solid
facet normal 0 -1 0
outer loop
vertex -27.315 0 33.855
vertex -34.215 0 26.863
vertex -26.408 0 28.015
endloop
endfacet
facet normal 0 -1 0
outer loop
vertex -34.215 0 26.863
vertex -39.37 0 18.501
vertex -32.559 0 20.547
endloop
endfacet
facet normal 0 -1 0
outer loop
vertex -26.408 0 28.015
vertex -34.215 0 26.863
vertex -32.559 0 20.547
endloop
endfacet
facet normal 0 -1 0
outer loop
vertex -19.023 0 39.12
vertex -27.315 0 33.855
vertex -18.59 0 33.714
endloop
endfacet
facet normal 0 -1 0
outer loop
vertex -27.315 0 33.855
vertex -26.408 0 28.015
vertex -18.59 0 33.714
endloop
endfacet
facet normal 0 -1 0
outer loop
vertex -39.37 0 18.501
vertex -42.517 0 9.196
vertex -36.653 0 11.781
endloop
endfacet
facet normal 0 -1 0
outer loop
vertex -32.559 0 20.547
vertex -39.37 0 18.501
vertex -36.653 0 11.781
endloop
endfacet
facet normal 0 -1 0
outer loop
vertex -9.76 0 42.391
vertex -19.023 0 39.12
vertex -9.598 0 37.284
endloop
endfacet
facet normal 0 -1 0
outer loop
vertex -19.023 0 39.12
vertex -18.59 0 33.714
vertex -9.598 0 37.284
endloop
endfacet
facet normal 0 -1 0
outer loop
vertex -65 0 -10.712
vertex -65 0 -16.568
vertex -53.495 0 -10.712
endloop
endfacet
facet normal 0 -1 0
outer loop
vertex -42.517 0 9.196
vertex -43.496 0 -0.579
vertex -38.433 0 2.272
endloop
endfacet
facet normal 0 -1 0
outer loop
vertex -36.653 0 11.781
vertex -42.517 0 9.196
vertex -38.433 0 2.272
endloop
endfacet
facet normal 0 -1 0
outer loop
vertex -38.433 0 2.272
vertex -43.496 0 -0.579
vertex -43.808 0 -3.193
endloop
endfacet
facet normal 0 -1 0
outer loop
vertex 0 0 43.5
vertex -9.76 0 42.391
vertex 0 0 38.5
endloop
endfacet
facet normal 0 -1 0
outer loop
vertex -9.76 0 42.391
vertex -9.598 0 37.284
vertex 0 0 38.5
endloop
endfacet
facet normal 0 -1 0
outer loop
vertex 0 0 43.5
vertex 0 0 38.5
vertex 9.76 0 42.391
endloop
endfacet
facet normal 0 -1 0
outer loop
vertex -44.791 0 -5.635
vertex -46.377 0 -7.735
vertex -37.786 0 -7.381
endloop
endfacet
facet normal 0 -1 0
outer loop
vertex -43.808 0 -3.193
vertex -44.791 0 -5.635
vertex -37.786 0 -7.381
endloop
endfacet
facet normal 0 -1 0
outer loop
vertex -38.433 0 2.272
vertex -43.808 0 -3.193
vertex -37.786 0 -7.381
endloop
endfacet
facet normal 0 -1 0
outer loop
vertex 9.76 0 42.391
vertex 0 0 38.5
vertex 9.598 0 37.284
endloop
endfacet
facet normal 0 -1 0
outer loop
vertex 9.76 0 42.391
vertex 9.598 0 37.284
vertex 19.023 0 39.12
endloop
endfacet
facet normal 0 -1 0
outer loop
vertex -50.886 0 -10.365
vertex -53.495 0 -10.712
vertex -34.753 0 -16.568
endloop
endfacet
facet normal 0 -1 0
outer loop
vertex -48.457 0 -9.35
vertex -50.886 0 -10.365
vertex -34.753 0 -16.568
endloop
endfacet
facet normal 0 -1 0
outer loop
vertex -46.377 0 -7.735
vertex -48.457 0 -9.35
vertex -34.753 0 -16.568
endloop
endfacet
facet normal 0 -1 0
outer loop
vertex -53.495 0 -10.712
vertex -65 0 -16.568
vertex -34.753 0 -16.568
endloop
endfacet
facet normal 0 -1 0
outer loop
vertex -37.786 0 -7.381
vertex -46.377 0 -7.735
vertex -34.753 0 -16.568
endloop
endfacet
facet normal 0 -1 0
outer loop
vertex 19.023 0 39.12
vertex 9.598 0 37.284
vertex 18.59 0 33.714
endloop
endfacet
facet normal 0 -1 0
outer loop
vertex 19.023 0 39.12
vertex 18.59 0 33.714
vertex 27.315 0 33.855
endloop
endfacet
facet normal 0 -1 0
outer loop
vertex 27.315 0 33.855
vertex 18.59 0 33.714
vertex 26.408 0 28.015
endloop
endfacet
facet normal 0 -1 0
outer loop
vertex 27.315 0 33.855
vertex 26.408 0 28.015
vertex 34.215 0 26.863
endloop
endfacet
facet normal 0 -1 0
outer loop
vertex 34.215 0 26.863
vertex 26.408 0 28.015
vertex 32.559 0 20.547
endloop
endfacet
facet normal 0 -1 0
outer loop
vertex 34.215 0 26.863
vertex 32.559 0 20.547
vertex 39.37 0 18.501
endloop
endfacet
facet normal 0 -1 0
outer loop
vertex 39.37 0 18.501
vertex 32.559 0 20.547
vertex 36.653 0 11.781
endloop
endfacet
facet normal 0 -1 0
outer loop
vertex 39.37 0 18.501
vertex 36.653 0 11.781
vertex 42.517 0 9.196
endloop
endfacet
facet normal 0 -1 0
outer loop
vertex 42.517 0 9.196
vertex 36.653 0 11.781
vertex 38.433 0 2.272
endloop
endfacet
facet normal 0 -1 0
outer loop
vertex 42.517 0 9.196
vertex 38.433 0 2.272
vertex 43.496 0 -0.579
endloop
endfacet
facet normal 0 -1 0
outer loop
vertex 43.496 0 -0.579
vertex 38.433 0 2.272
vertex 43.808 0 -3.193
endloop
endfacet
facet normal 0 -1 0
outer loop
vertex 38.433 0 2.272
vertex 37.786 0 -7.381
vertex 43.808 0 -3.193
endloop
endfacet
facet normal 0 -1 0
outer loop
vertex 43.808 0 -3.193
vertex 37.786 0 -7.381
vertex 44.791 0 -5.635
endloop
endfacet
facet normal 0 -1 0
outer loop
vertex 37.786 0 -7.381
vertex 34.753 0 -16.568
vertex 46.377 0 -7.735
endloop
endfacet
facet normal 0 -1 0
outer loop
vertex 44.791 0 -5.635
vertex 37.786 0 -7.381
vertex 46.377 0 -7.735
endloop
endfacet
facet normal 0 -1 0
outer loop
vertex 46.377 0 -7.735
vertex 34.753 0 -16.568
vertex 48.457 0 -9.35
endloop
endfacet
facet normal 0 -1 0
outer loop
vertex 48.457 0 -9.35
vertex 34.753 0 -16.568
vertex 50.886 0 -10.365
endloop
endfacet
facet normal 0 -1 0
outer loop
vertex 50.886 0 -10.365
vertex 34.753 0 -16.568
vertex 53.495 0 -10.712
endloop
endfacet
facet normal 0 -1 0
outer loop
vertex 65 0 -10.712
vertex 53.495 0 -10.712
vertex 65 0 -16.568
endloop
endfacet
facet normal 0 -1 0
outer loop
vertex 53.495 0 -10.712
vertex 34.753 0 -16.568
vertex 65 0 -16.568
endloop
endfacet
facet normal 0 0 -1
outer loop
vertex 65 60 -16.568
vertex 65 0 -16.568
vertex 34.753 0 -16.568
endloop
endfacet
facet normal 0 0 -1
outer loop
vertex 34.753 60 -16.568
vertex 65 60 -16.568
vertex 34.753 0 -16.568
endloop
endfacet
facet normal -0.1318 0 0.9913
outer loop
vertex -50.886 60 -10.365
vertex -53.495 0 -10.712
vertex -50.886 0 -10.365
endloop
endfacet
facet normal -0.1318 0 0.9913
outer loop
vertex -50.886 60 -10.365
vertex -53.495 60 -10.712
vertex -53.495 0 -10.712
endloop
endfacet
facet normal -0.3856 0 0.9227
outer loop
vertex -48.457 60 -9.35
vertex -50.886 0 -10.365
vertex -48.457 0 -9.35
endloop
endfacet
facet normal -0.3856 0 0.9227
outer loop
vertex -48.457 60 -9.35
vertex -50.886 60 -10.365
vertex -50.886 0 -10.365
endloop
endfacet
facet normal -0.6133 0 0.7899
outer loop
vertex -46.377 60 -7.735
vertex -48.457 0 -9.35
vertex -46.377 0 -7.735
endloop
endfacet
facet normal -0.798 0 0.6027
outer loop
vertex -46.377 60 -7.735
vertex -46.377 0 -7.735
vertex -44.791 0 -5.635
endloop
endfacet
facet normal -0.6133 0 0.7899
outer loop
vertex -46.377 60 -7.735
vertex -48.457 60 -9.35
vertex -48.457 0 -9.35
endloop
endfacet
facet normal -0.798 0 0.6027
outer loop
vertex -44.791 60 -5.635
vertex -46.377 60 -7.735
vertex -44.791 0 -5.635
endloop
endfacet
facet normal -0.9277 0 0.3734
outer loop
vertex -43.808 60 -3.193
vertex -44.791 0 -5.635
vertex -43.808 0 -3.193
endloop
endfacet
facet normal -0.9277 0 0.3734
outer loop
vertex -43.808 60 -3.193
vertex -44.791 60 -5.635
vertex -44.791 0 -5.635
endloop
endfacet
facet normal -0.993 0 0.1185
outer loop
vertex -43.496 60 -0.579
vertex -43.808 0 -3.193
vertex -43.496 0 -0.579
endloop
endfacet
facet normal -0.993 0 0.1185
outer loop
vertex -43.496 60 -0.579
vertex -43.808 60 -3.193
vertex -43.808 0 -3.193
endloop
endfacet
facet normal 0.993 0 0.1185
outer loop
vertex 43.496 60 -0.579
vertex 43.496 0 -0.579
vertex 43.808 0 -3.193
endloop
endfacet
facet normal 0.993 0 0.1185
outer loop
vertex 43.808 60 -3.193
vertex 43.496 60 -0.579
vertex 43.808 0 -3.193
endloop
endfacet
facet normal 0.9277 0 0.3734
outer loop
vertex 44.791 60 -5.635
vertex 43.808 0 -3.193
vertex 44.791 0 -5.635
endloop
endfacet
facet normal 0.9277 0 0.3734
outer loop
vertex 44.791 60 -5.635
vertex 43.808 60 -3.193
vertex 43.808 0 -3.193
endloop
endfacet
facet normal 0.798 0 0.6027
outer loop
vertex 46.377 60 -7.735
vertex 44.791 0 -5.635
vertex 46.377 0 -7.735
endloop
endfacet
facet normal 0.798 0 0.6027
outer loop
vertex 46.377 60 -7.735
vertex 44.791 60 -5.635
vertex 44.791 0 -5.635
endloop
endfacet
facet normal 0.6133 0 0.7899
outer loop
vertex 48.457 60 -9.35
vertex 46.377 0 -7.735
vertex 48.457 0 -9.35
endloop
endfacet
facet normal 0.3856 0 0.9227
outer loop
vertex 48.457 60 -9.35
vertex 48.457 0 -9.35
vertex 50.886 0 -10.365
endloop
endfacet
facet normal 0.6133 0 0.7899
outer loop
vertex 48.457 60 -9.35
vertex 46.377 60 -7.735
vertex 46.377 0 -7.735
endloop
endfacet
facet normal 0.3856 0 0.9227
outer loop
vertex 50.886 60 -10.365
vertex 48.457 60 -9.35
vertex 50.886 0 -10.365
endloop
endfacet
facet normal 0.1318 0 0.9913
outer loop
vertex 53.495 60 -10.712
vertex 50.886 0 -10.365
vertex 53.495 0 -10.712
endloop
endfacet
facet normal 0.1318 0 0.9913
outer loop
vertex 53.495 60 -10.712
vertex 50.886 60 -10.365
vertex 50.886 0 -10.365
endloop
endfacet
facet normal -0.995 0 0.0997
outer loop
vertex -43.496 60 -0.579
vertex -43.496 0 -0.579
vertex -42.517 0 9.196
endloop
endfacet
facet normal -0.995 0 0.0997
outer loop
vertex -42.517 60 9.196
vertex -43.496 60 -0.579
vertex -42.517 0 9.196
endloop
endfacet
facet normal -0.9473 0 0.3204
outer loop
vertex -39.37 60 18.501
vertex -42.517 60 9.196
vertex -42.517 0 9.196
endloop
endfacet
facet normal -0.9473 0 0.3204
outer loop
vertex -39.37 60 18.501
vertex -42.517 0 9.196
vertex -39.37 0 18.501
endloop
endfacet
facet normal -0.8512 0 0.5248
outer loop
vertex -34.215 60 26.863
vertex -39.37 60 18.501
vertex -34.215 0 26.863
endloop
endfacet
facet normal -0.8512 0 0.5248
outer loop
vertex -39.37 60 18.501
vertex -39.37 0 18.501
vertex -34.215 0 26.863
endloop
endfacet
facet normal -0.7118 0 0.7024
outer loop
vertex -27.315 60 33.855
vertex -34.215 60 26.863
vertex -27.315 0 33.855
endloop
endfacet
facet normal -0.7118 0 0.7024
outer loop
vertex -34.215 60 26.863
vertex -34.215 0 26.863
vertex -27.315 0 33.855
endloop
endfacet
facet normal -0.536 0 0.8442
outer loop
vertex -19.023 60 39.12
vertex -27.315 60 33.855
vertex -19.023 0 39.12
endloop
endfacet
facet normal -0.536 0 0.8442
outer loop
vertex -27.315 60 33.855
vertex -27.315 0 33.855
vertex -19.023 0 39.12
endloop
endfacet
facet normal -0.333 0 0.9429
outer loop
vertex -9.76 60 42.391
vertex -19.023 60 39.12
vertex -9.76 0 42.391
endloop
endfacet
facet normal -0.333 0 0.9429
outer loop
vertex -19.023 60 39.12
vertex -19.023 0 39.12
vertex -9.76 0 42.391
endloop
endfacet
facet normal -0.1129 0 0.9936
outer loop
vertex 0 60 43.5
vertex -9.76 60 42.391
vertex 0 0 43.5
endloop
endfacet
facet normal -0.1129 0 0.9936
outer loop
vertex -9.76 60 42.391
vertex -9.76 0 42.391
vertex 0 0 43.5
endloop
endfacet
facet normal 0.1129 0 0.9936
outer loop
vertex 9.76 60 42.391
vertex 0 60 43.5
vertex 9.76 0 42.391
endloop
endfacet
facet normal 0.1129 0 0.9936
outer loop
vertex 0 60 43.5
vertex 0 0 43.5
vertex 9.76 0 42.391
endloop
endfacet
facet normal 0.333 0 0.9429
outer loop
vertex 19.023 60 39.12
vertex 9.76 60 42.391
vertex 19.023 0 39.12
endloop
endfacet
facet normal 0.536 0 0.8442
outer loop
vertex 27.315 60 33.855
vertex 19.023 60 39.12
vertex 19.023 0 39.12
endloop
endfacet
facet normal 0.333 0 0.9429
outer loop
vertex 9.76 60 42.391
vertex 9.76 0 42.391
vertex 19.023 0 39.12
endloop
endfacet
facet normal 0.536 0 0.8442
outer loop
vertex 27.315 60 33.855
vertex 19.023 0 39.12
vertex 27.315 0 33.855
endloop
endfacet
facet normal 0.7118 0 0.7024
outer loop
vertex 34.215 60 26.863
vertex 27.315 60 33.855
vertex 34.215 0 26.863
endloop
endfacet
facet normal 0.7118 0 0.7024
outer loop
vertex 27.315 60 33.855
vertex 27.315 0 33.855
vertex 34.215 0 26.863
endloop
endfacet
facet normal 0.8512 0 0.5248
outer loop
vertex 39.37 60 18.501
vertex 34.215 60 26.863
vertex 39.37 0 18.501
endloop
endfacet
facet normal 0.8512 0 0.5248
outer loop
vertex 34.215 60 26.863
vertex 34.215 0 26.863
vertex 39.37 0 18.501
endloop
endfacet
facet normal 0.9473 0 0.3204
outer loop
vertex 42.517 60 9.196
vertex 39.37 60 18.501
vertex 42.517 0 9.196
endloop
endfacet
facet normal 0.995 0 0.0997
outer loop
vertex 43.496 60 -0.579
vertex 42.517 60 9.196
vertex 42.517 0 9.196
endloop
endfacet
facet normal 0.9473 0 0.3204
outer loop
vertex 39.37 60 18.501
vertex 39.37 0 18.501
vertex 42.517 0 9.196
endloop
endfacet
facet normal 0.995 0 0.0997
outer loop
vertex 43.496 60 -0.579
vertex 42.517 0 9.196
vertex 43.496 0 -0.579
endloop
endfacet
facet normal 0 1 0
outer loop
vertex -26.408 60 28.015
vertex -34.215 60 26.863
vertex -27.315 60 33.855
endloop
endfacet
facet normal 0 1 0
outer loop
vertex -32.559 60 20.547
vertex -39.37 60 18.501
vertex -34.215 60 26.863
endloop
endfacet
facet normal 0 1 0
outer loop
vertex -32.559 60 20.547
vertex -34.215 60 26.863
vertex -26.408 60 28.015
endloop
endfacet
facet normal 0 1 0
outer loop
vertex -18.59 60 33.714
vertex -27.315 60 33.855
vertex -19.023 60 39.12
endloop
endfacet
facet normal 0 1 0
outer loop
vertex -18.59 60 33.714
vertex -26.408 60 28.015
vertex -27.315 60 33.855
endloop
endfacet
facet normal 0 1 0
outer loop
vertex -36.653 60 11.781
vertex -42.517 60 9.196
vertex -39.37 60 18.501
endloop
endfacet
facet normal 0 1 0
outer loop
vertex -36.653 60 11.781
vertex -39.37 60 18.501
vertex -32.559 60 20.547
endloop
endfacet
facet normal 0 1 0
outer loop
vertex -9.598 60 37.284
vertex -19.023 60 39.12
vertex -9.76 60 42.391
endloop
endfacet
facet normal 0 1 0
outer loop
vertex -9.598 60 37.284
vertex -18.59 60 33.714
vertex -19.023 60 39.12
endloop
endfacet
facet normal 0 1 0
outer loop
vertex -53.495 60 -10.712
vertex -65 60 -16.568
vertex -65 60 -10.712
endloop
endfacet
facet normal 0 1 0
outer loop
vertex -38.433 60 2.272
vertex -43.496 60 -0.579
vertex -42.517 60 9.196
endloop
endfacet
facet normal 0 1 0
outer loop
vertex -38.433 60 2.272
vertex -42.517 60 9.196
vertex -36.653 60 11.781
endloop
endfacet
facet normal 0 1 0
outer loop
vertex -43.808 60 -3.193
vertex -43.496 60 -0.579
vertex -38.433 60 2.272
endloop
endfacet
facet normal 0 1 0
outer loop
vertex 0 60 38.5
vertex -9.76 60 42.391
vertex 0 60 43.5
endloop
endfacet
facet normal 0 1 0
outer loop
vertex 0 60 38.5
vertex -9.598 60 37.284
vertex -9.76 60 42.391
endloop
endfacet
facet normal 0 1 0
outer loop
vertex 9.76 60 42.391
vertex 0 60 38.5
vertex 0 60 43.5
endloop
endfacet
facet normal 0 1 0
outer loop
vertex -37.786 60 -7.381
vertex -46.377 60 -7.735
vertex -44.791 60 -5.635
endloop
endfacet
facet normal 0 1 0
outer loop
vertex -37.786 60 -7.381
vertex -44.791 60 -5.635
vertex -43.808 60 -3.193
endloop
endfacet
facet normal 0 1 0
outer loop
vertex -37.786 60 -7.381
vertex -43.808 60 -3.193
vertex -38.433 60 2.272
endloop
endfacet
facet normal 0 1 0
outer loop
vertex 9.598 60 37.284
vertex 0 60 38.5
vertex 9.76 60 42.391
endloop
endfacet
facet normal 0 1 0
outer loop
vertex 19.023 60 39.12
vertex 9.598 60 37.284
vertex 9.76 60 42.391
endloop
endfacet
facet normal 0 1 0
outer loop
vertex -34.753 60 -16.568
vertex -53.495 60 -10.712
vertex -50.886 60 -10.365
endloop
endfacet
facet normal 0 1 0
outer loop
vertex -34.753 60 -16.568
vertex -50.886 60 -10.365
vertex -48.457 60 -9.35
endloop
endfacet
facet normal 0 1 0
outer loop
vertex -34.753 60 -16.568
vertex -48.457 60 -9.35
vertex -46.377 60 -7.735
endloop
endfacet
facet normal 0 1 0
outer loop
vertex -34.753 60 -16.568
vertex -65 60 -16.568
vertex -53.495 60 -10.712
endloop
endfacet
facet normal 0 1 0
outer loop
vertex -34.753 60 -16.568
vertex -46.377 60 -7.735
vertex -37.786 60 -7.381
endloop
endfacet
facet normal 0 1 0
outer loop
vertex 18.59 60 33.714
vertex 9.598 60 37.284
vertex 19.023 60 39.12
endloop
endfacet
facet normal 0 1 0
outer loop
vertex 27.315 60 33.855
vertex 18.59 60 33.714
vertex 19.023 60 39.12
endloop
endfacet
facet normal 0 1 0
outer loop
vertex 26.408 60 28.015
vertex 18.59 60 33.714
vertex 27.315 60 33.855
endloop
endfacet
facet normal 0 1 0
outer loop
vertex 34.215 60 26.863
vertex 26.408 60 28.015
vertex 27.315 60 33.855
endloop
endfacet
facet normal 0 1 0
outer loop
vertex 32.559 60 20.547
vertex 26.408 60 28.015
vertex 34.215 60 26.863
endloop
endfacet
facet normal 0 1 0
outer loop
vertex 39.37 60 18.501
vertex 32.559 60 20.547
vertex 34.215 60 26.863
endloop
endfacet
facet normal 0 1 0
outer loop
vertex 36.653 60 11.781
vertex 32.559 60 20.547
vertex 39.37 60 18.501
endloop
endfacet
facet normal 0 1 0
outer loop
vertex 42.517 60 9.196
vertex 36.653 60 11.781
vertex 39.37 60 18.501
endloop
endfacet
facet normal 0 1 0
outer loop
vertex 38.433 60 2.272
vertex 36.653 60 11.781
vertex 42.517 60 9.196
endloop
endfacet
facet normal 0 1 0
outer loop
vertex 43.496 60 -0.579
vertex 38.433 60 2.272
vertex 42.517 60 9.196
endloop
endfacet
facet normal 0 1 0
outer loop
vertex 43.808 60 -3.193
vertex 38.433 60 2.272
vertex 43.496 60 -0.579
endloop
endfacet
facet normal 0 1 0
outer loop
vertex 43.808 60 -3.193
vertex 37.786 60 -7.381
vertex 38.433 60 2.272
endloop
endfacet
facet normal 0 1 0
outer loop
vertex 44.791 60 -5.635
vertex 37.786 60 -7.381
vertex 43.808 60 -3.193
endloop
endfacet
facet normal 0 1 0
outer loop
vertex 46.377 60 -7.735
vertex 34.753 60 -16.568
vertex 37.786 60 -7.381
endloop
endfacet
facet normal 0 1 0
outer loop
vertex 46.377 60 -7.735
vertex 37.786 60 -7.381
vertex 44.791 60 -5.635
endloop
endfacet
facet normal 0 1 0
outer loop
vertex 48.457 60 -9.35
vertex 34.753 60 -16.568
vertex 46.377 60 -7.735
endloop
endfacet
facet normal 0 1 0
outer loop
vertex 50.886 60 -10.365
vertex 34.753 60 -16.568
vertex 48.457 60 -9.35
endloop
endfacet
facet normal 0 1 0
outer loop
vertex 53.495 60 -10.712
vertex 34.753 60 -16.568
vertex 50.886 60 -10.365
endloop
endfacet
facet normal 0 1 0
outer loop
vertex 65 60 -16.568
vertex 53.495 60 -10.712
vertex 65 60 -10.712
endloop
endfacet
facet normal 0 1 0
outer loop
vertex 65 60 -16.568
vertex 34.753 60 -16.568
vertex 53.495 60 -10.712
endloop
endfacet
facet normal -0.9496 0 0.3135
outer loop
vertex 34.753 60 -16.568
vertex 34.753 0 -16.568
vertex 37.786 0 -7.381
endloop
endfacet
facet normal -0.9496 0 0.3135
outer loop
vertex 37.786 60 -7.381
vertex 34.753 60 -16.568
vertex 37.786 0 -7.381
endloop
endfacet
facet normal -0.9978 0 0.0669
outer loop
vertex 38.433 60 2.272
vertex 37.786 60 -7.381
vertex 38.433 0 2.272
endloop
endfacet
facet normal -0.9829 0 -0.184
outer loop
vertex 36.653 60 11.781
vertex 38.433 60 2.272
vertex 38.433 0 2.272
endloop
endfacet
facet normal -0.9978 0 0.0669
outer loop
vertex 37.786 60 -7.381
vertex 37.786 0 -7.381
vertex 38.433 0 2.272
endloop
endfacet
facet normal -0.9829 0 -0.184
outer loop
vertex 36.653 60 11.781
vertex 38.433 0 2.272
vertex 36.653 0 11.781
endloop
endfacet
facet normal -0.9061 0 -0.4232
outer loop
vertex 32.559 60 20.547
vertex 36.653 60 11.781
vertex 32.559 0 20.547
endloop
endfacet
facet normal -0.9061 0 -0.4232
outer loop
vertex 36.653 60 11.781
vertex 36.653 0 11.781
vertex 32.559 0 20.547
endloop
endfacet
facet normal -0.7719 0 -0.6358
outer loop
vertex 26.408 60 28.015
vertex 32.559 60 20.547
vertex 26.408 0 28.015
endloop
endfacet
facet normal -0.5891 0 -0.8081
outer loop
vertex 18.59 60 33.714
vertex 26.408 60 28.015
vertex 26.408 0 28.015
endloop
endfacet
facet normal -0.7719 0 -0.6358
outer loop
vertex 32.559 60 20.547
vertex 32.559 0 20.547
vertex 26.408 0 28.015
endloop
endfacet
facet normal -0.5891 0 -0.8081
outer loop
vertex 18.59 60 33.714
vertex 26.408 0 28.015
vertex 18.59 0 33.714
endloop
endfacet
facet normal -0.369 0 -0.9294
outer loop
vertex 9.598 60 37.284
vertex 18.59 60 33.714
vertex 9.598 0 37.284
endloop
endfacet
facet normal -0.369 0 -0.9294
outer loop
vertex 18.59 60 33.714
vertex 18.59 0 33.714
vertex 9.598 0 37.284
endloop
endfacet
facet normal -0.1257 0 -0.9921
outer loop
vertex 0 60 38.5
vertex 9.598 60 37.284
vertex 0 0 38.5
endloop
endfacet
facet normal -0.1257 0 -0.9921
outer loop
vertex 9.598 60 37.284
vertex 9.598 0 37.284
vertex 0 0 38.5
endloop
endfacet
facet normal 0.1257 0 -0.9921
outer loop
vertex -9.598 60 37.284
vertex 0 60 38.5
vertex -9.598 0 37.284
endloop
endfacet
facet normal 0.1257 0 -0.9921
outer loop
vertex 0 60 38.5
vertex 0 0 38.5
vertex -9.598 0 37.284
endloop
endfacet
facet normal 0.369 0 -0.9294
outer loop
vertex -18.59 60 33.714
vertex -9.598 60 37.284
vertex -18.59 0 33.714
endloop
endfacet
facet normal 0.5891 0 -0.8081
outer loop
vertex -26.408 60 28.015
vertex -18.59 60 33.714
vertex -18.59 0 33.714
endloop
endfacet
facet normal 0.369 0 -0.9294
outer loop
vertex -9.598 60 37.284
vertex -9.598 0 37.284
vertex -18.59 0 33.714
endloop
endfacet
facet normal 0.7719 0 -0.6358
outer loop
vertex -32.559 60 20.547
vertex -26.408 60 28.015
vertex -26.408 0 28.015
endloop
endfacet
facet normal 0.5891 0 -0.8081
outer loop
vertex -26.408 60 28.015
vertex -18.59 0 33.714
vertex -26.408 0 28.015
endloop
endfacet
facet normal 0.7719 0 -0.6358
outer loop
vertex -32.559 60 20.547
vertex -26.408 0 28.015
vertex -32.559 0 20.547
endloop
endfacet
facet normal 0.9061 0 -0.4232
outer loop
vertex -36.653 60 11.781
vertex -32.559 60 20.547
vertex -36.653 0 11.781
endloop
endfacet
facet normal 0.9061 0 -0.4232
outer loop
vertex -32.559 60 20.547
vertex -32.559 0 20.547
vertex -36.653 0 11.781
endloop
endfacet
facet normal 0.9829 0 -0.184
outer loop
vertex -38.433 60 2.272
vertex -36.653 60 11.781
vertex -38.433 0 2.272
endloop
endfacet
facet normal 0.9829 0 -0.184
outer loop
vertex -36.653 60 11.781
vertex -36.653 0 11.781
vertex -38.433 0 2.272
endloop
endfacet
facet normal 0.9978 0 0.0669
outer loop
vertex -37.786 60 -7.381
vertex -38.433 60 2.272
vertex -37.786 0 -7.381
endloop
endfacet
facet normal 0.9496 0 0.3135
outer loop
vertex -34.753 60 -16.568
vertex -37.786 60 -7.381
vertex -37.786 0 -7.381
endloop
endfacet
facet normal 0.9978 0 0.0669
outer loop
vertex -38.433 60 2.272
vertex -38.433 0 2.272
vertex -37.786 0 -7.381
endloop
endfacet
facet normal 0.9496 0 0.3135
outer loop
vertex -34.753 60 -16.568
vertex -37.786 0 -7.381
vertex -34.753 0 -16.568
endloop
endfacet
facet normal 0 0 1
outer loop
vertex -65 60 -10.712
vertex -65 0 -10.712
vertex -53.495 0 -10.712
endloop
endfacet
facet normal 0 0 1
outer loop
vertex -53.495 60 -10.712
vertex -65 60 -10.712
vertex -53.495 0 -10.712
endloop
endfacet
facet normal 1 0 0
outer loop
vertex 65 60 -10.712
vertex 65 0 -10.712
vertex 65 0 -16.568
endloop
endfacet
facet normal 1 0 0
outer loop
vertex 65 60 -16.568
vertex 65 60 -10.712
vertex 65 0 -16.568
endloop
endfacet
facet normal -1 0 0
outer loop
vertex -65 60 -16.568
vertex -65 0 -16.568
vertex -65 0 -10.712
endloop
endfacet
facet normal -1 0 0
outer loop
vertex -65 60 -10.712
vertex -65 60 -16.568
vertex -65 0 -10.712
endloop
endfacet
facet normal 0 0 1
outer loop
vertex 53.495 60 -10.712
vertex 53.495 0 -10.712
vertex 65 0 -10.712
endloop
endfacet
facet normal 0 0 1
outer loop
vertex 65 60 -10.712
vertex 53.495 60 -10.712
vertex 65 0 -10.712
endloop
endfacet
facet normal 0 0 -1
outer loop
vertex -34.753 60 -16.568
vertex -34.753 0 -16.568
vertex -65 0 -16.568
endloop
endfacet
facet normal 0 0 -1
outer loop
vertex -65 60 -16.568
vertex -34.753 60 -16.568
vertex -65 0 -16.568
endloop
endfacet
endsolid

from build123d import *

# Parameters (mm, degrees)
BOSS_EXTRUDE2_DEPTH = 60
FILLET3_R           = 10


with BuildPart() as part:
    # Sketch1 → Boss-Extrude2 (new body)
    with BuildSketch(Plane(origin=(0, 0, 0), x_dir=(1, 0, 0), z_dir=(0, 1, 0))):
        with BuildLine():
            Line((-65, 10.711576414), (-42.160551831, 10.711576414))
            ThreePointArc((-42.160551831, 10.711576414), (0, -43.5), (42.160551831, 10.711576414))
            Line((42.160551831, 10.711576414), (65, 10.711576414))
            Line((65, 10.711576414), (65, 16.568265676))
            Line((65, 16.568265676), (34.752590874, 16.568265676))
            ThreePointArc((34.752590874, 16.568265676), (0, -38.5), (-34.752590874, 16.568265676))
            Line((-34.752590874, 16.568265676), (-65, 16.568265676))
            Line((-65, 16.568265676), (-65, 10.711576414))
        make_face()
    extrude(amount=BOSS_EXTRUDE2_DEPTH)

    # Fillet3
    fillet3_edges = [part.edges().sort_by_distance(p)[0] for p in [
        (42.160551831, 30, -10.711576414),
        (-42.160551831, 30, -10.711576414),
    ]]
    fillet(fillet3_edges, radius=FILLET3_R)


solid = part.part
